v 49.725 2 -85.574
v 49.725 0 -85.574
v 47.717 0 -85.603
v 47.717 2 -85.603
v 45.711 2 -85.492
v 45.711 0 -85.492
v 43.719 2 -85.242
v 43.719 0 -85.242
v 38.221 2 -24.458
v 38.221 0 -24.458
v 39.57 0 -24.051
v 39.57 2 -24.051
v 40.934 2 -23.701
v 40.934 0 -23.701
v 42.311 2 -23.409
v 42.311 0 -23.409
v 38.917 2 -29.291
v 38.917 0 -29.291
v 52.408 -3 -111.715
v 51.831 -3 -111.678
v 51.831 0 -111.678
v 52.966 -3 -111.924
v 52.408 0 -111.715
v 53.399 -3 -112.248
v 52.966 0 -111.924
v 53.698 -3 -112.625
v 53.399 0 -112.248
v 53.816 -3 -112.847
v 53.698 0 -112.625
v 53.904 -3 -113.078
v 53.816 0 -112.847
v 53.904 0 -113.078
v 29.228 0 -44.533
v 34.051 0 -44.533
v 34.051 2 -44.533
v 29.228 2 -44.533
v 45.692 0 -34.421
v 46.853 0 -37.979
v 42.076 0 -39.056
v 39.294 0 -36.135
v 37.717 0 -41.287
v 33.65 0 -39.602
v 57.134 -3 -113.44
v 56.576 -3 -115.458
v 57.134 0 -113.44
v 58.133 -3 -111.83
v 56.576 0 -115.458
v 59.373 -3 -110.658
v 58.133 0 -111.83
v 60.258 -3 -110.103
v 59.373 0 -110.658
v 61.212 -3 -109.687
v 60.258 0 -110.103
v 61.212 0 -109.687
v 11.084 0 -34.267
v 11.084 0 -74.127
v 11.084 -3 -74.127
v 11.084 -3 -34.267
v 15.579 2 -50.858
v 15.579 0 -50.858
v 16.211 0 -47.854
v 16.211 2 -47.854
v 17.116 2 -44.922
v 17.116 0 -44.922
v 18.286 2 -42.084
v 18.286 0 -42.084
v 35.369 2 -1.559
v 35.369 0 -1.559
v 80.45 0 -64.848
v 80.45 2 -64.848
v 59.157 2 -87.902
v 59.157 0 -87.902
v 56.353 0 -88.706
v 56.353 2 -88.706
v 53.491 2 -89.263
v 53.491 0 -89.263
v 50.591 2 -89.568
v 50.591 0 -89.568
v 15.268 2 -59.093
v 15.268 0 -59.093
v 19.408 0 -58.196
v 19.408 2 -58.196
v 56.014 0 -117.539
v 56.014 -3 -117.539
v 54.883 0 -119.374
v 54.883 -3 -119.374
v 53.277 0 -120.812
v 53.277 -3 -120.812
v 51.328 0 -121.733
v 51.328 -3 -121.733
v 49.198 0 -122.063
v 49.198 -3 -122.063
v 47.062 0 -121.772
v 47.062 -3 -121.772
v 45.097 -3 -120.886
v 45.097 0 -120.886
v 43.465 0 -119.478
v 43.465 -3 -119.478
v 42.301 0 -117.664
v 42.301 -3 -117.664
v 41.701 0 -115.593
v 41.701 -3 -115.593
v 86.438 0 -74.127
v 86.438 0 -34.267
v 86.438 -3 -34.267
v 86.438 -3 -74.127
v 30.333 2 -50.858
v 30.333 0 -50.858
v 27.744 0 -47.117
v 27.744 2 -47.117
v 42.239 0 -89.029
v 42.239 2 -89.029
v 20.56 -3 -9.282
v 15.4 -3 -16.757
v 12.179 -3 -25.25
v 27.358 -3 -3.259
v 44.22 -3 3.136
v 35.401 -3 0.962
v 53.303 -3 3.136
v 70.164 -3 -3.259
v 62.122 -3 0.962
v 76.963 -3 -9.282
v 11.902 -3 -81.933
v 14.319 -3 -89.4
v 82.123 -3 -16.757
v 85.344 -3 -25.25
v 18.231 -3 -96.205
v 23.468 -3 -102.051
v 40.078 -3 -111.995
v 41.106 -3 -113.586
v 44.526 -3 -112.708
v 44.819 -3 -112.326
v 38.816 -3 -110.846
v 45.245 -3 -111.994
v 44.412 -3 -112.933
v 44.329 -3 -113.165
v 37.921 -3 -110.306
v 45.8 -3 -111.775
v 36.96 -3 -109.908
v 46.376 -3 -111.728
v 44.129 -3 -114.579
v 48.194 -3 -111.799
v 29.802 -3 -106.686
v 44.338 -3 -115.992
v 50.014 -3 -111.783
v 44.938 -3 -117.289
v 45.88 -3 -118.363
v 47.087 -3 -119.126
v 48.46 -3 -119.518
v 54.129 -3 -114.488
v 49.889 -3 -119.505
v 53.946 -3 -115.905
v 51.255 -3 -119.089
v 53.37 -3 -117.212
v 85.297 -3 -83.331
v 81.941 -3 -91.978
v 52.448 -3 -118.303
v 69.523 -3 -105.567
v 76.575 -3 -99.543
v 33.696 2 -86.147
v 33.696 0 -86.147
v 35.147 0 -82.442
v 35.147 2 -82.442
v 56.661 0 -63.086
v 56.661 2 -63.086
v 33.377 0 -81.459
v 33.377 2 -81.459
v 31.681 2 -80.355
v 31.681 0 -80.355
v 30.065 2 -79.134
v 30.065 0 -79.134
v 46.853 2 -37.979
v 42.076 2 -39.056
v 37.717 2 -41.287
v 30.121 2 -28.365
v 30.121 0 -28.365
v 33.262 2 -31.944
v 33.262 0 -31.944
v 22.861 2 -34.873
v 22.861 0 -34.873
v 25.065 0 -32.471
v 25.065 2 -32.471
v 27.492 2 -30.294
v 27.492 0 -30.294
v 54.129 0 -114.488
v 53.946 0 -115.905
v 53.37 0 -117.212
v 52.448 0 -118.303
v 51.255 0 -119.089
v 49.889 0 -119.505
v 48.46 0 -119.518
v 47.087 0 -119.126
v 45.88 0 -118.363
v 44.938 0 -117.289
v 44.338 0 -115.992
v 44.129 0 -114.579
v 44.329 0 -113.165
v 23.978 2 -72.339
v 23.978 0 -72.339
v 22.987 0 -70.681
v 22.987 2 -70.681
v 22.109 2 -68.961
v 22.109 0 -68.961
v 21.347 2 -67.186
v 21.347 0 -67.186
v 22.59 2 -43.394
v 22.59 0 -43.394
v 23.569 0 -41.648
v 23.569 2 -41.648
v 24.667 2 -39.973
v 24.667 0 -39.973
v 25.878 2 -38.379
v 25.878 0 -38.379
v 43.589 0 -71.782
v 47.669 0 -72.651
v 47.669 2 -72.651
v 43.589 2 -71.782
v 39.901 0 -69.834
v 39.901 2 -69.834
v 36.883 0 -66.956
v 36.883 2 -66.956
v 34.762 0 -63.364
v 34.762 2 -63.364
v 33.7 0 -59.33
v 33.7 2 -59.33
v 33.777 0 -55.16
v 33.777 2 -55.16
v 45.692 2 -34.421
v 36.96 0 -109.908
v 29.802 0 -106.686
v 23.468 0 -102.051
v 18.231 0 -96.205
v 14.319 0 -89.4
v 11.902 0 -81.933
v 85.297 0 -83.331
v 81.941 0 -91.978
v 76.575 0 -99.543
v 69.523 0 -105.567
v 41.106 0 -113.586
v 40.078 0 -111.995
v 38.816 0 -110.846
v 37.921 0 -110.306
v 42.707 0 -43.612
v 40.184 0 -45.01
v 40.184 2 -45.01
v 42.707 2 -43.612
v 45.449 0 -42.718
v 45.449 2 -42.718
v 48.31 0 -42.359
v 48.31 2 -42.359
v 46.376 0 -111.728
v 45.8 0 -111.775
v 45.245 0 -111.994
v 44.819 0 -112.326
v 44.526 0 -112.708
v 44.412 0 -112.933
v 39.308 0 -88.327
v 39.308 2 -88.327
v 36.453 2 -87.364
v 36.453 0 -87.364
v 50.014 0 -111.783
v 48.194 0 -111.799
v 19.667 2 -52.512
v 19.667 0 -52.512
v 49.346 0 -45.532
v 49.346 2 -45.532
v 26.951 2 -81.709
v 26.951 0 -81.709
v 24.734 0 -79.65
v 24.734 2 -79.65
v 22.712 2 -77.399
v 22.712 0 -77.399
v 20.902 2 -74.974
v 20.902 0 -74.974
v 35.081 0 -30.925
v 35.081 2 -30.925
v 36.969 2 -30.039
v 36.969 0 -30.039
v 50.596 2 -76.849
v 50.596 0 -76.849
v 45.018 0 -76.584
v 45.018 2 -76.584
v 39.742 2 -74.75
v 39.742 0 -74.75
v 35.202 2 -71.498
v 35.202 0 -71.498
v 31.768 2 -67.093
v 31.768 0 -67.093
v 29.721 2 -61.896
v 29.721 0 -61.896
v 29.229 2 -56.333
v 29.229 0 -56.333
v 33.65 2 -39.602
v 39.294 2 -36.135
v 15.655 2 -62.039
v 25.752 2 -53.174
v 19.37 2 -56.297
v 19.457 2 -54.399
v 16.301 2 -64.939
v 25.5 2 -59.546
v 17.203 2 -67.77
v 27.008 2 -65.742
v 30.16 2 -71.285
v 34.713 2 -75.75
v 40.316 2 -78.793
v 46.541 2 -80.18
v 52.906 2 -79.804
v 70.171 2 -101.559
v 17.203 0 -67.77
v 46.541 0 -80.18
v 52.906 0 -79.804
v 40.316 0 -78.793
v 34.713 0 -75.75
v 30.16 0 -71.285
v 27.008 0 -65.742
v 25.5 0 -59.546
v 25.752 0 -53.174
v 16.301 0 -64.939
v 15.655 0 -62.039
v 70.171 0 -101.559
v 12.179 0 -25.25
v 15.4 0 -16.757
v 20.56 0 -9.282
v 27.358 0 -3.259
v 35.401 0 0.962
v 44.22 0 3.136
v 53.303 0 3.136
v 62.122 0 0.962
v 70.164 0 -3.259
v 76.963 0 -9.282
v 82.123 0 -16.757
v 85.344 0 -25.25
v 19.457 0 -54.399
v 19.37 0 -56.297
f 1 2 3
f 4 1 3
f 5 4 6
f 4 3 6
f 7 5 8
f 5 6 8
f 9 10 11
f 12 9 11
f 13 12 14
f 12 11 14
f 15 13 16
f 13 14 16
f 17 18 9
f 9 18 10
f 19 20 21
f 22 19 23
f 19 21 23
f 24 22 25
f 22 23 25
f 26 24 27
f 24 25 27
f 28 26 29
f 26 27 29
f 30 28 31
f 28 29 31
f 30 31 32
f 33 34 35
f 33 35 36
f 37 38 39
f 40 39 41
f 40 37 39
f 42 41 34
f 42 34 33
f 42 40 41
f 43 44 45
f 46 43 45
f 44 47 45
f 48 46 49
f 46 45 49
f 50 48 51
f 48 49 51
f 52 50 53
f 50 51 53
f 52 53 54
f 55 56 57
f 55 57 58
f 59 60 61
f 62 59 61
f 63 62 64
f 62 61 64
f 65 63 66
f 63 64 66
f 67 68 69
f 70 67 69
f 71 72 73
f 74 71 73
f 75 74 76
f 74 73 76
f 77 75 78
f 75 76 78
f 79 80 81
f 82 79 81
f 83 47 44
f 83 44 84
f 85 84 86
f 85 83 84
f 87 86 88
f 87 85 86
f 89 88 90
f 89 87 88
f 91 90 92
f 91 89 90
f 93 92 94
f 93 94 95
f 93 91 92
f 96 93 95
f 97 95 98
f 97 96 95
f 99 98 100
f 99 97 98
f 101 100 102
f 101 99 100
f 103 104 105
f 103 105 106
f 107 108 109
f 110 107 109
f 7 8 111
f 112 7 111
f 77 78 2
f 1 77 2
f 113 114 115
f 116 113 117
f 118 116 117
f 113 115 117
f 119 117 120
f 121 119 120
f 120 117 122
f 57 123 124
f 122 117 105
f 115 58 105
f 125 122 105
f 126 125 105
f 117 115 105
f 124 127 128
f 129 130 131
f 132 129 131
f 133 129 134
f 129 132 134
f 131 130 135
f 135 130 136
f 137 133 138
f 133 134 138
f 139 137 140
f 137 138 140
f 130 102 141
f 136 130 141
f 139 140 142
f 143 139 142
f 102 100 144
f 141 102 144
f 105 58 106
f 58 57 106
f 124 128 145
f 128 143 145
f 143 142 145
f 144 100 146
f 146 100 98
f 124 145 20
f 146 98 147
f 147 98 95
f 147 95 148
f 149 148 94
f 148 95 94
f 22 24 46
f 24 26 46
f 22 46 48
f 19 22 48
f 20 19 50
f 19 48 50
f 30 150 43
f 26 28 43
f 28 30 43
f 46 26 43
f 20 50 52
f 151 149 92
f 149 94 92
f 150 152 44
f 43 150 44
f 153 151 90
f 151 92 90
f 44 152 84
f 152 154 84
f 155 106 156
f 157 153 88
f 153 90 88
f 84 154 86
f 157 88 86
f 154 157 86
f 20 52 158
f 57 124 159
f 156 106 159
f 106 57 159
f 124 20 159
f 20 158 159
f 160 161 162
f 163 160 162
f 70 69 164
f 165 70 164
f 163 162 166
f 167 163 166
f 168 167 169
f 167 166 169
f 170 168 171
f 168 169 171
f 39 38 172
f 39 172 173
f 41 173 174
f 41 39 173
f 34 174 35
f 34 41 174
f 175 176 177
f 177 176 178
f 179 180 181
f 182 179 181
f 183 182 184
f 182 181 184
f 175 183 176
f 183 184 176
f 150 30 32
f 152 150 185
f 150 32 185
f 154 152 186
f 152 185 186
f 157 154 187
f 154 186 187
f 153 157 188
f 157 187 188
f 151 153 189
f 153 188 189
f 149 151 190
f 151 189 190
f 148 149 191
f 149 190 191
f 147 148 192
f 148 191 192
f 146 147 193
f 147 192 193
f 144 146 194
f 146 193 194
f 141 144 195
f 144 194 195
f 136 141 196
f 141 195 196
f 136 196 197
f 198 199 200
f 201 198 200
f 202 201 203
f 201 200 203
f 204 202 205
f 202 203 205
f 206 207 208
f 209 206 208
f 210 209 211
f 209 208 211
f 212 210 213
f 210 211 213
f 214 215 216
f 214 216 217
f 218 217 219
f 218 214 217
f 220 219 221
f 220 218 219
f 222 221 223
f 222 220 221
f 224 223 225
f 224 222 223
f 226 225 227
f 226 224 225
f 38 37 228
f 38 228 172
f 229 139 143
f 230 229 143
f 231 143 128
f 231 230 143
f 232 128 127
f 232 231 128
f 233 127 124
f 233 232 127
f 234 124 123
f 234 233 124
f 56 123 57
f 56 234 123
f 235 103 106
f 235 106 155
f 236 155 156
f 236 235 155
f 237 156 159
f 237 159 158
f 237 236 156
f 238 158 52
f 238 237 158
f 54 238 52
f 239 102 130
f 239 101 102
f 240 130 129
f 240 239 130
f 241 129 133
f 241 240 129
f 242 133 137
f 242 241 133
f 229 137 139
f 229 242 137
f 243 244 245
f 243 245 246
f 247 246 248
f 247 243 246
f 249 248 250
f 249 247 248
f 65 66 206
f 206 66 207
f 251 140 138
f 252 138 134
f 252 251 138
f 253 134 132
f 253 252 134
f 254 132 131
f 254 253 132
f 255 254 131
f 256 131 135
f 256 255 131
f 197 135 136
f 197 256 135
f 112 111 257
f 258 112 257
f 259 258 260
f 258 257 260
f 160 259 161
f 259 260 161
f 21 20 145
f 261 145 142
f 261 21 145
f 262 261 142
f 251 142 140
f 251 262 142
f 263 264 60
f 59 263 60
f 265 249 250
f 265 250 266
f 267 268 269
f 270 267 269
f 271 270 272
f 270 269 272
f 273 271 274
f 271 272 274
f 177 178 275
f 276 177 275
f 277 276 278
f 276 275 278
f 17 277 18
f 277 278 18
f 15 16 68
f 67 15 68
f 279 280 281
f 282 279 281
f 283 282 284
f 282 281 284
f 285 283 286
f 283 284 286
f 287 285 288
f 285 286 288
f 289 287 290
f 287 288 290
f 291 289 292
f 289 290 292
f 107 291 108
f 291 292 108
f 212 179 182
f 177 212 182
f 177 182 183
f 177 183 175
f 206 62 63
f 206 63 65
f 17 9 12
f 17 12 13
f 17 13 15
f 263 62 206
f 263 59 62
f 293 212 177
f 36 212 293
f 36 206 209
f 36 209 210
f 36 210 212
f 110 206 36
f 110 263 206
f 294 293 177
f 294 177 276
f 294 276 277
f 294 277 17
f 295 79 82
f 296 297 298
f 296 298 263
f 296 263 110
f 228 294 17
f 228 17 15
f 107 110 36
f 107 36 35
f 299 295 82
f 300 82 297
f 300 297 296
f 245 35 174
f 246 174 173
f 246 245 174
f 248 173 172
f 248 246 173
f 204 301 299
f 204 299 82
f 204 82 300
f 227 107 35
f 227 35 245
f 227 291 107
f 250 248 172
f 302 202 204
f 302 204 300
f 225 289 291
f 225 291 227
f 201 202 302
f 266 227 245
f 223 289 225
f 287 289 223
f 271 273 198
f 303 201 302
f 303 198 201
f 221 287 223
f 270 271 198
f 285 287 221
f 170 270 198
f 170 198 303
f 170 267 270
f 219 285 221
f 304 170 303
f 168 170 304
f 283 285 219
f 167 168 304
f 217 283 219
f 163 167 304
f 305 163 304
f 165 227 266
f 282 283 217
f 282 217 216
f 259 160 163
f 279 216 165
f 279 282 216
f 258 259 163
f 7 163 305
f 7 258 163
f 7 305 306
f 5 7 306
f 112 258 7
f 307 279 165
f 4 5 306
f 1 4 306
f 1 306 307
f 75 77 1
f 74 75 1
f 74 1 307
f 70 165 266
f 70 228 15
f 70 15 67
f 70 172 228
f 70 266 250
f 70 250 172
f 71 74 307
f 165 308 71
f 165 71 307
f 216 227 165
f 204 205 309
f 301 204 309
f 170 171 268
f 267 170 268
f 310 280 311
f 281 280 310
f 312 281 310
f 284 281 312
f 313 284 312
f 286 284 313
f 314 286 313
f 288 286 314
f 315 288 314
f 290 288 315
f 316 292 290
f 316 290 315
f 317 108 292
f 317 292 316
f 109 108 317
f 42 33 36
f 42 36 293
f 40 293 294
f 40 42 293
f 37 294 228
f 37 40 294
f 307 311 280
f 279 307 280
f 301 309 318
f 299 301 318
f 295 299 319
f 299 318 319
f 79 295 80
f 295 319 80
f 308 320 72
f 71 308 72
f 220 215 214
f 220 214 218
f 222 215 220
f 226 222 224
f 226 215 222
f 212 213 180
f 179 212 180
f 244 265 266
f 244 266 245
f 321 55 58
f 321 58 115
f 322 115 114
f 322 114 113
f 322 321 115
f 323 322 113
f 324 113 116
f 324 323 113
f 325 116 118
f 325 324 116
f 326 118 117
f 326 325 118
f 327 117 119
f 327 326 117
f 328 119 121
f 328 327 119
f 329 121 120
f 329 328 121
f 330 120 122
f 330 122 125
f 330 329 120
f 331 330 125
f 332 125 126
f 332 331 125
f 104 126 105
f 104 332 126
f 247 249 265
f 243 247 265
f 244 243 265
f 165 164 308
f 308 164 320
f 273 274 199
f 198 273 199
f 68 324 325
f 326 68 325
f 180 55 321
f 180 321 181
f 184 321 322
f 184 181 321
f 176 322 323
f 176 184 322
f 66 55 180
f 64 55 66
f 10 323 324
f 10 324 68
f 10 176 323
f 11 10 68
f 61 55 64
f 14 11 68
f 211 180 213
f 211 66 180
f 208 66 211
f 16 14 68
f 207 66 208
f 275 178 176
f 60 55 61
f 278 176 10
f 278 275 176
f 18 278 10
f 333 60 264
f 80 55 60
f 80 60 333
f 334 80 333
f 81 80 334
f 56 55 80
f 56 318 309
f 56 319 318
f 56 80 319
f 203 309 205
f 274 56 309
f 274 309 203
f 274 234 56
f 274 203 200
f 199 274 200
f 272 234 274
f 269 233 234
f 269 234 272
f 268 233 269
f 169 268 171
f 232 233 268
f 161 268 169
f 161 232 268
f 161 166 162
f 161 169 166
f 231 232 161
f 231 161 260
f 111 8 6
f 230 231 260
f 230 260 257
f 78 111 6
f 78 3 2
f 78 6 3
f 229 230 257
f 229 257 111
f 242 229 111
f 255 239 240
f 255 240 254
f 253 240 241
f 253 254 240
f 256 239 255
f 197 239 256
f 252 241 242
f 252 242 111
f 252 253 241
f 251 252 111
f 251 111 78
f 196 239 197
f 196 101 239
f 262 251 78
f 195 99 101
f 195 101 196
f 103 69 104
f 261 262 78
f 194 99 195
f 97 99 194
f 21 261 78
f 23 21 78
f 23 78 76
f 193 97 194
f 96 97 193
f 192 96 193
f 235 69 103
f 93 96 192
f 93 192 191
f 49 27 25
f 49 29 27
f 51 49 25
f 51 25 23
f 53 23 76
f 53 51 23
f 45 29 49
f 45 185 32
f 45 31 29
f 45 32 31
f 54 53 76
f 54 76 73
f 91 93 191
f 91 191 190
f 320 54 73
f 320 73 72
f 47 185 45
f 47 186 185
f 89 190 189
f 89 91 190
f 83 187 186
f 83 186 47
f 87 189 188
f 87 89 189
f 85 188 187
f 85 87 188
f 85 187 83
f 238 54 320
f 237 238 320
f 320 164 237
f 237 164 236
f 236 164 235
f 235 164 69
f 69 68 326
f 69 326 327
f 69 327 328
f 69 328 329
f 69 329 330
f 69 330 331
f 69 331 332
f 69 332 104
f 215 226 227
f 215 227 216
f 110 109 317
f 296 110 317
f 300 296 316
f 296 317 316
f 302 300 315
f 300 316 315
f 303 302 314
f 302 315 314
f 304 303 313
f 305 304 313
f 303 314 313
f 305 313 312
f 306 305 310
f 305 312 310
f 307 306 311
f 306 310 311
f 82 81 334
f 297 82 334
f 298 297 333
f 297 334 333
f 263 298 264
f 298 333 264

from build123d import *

# Parameters (mm, degrees)
RESSALTO_EXTRUS_O1_DEPTH = 2
RESSALTO_EXTRUS_O2_DEPTH = 3
ESBO_O4_R                = 7.5
ESBO_O4_R_2              = 5
RESSALTO_EXTRUS_O3_DEPTH = 3
FILETE4_R                = 7
FILETE5_R                = 2


with BuildPart() as part:
    # Esboço1 → Ressalto-extrusão1 (new body)
    with BuildSketch(Plane(origin=(0, 0, 0), x_dir=(1, 0, 0), z_dir=(0, 1, 0))):
        with BuildLine():
            Line((35.368861757, 1.558526937), (80.44962534, 64.847807407))
            Line((80.44962534, 64.847807407), (56.661079085, 63.08569287))
            Line((56.661079085, 63.08569287), (70.170623872, 101.558526937))
            Line((70.170623872, 101.558526937), (59.156651238, 87.901974937))
            ThreePointArc((59.156651238, 87.901974937), (54.928228331, 89.016089828), (50.590505915, 89.568336625))
            Line((50.590505915, 89.568336625), (49.725051843, 85.574021555))
            ThreePointArc((49.725051843, 85.574021555), (46.713204504, 85.564588761), (43.718646065, 85.242202157))
            Line((43.718646065, 85.242202157), (42.238652592, 89.029169094))
            ThreePointArc((42.238652592, 89.029169094), (37.869771908, 87.87748691), (33.696266723, 86.146780478))
            Line((33.696266723, 86.146780478), (35.147163269, 82.442381585))
            ThreePointArc((35.147163269, 82.442381585), (32.519355747, 80.921668866), (30.065315343, 79.134037687))
            Line((30.065315343, 79.134037687), (26.950821583, 81.70865653))
            ThreePointArc((26.950821583, 81.70865653), (23.697250977, 78.547127541), (20.902055839, 74.973911711))
            Line((20.902055839, 74.973911711), (23.978190261, 72.338887308))
            ThreePointArc((23.978190261, 72.338887308), (22.53348512, 69.828267118), (21.346972592, 67.18581093))
            Line((21.346972592, 67.18581093), (17.203178516, 67.77029239))
            ThreePointArc((17.203178516, 67.77029239), (15.945727998, 63.496158243), (15.268245742, 59.09270252))
            Line((15.268245742, 59.09270252), (19.408088551, 58.19571674))
            ThreePointArc((19.408088551, 58.19571674), (19.397757282, 55.347323146), (19.667469692, 52.511708923))
            Line((19.667469692, 52.511708923), (15.579228762, 50.857655899))
            ThreePointArc((15.579228762, 50.857655899), (16.629849838, 46.377497076), (18.286206869, 42.084233852))
            Line((18.286206869, 42.084233852), (22.590276365, 43.394445807))
            ThreePointArc((22.590276365, 43.394445807), (24.103796918, 40.801148677), (25.877857628, 38.378620441))
            Line((25.877857628, 38.378620441), (22.860818156, 34.873071796))
            ThreePointArc((22.860818156, 34.873071796), (26.252016309, 31.352757541), (30.120648437, 28.365028835))
            Line((30.120648437, 28.365028835), (33.261631483, 31.944309078))
            ThreePointArc((33.261631483, 31.944309078), (36.017323235, 30.464825168), (38.916576083, 29.291350585))
            Line((38.916576083, 29.291350585), (38.221393853, 24.458284446))
            ThreePointArc((38.221393853, 24.458284446), (40.249791444, 23.869041331), (42.311374517, 23.409172359))
            Line((42.311374517, 23.409172359), (35.368861757, 1.558526937))
        make_face()
        with BuildLine():
            Line((45.69219136, 34.421477023), (46.852612972, 37.978627375))
            ThreePointArc((46.852612972, 37.978627375), (39.82616677, 40.034244908), (34.05073918, 44.533238778))
            Line((34.05073918, 44.533238778), (29.228152417, 44.533238778))
            ThreePointArc((29.228152417, 44.533238778), (36.346609181, 37.664247561), (45.69219136, 34.421477023))
        make_face(mode=Mode.SUBTRACT)
        with BuildLine():
            Line((48.310484351, 42.358641567), (49.345616552, 45.531730412))
            Line((49.345616552, 45.531730412), (40.18411035, 45.009645625))
            ThreePointArc((40.18411035, 45.009645625), (44.056709172, 43.099915587), (48.310484351, 42.358641567))
        make_face(mode=Mode.SUBTRACT)
        with BuildLine():
            Line((33.776854594, 55.159722076), (47.668932581, 72.651374716))
            ThreePointArc((47.668932581, 72.651374716), (36.882518839, 66.95561957), (33.776854594, 55.159722076))
        make_face(mode=Mode.SUBTRACT)
        with BuildLine():
            Line((30.333100839, 50.857655899), (27.743535352, 47.116522773))
            ThreePointArc((27.743535352, 47.116522773), (30.159670342, 71.285374829), (52.90625945, 79.803813767))
            Line((52.90625945, 79.803813767), (50.5964095, 76.848744643))
            ThreePointArc((50.5964095, 76.848744643), (33.326207959, 69.418591815), (30.333100839, 50.857655899))
        make_face(mode=Mode.SUBTRACT)
    extrude(amount=RESSALTO_EXTRUS_O1_DEPTH)

    # Esboço3 → Ressalto-extrusão2 (add)
    with BuildSketch(Plane.XZ):
        with BuildLine():
            Line((11.084172824, -74.126509554), (11.084172824, -34.266887476))
            ThreePointArc((11.084172824, -34.266887476), (48.761301795, 3.410241496), (86.438430767, -34.266887476))
            Line((86.438430767, -34.266887476), (86.438430767, -74.126509554))
            ThreePointArc((86.438430767, -74.126509554), (48.761301795, -111.803638526), (11.084172824, -74.126509554))
        make_face()
    extrude(amount=RESSALTO_EXTRUS_O2_DEPTH)

    # Esboço4 → Ressalto-extrusão3 (add)
    with BuildSketch(Plane(origin=(0, 0, 0), x_dir=(1, 0, 0), z_dir=(0, 1, 0))):
        with Locations((49.129422152, 114.56282345)):
            Circle(ESBO_O4_R)
        with Locations((49.129422152, 114.56282345)):
            Circle(ESBO_O4_R_2, mode=Mode.SUBTRACT)
    extrude(amount=-RESSALTO_EXTRUS_O3_DEPTH)

    # Filete4
    filete4_edges = [part.edges().sort_by_distance(p)[0] for p in [
        (42.394905756, -1.5, -111.261870721),
        (55.802725528, -1.5, -111.139809858),
    ]]
    fillet(filete4_edges, radius=FILETE4_R)

    # Filete5
    filete5_edges = [part.edges().sort_by_distance(p)[0] for p in [
        (45.084410441, -1.5, -111.623796356),
        (53.120255788, -1.5, -111.550640374),
    ]]
    fillet(filete5_edges, radius=FILETE5_R)


solid = part.part
